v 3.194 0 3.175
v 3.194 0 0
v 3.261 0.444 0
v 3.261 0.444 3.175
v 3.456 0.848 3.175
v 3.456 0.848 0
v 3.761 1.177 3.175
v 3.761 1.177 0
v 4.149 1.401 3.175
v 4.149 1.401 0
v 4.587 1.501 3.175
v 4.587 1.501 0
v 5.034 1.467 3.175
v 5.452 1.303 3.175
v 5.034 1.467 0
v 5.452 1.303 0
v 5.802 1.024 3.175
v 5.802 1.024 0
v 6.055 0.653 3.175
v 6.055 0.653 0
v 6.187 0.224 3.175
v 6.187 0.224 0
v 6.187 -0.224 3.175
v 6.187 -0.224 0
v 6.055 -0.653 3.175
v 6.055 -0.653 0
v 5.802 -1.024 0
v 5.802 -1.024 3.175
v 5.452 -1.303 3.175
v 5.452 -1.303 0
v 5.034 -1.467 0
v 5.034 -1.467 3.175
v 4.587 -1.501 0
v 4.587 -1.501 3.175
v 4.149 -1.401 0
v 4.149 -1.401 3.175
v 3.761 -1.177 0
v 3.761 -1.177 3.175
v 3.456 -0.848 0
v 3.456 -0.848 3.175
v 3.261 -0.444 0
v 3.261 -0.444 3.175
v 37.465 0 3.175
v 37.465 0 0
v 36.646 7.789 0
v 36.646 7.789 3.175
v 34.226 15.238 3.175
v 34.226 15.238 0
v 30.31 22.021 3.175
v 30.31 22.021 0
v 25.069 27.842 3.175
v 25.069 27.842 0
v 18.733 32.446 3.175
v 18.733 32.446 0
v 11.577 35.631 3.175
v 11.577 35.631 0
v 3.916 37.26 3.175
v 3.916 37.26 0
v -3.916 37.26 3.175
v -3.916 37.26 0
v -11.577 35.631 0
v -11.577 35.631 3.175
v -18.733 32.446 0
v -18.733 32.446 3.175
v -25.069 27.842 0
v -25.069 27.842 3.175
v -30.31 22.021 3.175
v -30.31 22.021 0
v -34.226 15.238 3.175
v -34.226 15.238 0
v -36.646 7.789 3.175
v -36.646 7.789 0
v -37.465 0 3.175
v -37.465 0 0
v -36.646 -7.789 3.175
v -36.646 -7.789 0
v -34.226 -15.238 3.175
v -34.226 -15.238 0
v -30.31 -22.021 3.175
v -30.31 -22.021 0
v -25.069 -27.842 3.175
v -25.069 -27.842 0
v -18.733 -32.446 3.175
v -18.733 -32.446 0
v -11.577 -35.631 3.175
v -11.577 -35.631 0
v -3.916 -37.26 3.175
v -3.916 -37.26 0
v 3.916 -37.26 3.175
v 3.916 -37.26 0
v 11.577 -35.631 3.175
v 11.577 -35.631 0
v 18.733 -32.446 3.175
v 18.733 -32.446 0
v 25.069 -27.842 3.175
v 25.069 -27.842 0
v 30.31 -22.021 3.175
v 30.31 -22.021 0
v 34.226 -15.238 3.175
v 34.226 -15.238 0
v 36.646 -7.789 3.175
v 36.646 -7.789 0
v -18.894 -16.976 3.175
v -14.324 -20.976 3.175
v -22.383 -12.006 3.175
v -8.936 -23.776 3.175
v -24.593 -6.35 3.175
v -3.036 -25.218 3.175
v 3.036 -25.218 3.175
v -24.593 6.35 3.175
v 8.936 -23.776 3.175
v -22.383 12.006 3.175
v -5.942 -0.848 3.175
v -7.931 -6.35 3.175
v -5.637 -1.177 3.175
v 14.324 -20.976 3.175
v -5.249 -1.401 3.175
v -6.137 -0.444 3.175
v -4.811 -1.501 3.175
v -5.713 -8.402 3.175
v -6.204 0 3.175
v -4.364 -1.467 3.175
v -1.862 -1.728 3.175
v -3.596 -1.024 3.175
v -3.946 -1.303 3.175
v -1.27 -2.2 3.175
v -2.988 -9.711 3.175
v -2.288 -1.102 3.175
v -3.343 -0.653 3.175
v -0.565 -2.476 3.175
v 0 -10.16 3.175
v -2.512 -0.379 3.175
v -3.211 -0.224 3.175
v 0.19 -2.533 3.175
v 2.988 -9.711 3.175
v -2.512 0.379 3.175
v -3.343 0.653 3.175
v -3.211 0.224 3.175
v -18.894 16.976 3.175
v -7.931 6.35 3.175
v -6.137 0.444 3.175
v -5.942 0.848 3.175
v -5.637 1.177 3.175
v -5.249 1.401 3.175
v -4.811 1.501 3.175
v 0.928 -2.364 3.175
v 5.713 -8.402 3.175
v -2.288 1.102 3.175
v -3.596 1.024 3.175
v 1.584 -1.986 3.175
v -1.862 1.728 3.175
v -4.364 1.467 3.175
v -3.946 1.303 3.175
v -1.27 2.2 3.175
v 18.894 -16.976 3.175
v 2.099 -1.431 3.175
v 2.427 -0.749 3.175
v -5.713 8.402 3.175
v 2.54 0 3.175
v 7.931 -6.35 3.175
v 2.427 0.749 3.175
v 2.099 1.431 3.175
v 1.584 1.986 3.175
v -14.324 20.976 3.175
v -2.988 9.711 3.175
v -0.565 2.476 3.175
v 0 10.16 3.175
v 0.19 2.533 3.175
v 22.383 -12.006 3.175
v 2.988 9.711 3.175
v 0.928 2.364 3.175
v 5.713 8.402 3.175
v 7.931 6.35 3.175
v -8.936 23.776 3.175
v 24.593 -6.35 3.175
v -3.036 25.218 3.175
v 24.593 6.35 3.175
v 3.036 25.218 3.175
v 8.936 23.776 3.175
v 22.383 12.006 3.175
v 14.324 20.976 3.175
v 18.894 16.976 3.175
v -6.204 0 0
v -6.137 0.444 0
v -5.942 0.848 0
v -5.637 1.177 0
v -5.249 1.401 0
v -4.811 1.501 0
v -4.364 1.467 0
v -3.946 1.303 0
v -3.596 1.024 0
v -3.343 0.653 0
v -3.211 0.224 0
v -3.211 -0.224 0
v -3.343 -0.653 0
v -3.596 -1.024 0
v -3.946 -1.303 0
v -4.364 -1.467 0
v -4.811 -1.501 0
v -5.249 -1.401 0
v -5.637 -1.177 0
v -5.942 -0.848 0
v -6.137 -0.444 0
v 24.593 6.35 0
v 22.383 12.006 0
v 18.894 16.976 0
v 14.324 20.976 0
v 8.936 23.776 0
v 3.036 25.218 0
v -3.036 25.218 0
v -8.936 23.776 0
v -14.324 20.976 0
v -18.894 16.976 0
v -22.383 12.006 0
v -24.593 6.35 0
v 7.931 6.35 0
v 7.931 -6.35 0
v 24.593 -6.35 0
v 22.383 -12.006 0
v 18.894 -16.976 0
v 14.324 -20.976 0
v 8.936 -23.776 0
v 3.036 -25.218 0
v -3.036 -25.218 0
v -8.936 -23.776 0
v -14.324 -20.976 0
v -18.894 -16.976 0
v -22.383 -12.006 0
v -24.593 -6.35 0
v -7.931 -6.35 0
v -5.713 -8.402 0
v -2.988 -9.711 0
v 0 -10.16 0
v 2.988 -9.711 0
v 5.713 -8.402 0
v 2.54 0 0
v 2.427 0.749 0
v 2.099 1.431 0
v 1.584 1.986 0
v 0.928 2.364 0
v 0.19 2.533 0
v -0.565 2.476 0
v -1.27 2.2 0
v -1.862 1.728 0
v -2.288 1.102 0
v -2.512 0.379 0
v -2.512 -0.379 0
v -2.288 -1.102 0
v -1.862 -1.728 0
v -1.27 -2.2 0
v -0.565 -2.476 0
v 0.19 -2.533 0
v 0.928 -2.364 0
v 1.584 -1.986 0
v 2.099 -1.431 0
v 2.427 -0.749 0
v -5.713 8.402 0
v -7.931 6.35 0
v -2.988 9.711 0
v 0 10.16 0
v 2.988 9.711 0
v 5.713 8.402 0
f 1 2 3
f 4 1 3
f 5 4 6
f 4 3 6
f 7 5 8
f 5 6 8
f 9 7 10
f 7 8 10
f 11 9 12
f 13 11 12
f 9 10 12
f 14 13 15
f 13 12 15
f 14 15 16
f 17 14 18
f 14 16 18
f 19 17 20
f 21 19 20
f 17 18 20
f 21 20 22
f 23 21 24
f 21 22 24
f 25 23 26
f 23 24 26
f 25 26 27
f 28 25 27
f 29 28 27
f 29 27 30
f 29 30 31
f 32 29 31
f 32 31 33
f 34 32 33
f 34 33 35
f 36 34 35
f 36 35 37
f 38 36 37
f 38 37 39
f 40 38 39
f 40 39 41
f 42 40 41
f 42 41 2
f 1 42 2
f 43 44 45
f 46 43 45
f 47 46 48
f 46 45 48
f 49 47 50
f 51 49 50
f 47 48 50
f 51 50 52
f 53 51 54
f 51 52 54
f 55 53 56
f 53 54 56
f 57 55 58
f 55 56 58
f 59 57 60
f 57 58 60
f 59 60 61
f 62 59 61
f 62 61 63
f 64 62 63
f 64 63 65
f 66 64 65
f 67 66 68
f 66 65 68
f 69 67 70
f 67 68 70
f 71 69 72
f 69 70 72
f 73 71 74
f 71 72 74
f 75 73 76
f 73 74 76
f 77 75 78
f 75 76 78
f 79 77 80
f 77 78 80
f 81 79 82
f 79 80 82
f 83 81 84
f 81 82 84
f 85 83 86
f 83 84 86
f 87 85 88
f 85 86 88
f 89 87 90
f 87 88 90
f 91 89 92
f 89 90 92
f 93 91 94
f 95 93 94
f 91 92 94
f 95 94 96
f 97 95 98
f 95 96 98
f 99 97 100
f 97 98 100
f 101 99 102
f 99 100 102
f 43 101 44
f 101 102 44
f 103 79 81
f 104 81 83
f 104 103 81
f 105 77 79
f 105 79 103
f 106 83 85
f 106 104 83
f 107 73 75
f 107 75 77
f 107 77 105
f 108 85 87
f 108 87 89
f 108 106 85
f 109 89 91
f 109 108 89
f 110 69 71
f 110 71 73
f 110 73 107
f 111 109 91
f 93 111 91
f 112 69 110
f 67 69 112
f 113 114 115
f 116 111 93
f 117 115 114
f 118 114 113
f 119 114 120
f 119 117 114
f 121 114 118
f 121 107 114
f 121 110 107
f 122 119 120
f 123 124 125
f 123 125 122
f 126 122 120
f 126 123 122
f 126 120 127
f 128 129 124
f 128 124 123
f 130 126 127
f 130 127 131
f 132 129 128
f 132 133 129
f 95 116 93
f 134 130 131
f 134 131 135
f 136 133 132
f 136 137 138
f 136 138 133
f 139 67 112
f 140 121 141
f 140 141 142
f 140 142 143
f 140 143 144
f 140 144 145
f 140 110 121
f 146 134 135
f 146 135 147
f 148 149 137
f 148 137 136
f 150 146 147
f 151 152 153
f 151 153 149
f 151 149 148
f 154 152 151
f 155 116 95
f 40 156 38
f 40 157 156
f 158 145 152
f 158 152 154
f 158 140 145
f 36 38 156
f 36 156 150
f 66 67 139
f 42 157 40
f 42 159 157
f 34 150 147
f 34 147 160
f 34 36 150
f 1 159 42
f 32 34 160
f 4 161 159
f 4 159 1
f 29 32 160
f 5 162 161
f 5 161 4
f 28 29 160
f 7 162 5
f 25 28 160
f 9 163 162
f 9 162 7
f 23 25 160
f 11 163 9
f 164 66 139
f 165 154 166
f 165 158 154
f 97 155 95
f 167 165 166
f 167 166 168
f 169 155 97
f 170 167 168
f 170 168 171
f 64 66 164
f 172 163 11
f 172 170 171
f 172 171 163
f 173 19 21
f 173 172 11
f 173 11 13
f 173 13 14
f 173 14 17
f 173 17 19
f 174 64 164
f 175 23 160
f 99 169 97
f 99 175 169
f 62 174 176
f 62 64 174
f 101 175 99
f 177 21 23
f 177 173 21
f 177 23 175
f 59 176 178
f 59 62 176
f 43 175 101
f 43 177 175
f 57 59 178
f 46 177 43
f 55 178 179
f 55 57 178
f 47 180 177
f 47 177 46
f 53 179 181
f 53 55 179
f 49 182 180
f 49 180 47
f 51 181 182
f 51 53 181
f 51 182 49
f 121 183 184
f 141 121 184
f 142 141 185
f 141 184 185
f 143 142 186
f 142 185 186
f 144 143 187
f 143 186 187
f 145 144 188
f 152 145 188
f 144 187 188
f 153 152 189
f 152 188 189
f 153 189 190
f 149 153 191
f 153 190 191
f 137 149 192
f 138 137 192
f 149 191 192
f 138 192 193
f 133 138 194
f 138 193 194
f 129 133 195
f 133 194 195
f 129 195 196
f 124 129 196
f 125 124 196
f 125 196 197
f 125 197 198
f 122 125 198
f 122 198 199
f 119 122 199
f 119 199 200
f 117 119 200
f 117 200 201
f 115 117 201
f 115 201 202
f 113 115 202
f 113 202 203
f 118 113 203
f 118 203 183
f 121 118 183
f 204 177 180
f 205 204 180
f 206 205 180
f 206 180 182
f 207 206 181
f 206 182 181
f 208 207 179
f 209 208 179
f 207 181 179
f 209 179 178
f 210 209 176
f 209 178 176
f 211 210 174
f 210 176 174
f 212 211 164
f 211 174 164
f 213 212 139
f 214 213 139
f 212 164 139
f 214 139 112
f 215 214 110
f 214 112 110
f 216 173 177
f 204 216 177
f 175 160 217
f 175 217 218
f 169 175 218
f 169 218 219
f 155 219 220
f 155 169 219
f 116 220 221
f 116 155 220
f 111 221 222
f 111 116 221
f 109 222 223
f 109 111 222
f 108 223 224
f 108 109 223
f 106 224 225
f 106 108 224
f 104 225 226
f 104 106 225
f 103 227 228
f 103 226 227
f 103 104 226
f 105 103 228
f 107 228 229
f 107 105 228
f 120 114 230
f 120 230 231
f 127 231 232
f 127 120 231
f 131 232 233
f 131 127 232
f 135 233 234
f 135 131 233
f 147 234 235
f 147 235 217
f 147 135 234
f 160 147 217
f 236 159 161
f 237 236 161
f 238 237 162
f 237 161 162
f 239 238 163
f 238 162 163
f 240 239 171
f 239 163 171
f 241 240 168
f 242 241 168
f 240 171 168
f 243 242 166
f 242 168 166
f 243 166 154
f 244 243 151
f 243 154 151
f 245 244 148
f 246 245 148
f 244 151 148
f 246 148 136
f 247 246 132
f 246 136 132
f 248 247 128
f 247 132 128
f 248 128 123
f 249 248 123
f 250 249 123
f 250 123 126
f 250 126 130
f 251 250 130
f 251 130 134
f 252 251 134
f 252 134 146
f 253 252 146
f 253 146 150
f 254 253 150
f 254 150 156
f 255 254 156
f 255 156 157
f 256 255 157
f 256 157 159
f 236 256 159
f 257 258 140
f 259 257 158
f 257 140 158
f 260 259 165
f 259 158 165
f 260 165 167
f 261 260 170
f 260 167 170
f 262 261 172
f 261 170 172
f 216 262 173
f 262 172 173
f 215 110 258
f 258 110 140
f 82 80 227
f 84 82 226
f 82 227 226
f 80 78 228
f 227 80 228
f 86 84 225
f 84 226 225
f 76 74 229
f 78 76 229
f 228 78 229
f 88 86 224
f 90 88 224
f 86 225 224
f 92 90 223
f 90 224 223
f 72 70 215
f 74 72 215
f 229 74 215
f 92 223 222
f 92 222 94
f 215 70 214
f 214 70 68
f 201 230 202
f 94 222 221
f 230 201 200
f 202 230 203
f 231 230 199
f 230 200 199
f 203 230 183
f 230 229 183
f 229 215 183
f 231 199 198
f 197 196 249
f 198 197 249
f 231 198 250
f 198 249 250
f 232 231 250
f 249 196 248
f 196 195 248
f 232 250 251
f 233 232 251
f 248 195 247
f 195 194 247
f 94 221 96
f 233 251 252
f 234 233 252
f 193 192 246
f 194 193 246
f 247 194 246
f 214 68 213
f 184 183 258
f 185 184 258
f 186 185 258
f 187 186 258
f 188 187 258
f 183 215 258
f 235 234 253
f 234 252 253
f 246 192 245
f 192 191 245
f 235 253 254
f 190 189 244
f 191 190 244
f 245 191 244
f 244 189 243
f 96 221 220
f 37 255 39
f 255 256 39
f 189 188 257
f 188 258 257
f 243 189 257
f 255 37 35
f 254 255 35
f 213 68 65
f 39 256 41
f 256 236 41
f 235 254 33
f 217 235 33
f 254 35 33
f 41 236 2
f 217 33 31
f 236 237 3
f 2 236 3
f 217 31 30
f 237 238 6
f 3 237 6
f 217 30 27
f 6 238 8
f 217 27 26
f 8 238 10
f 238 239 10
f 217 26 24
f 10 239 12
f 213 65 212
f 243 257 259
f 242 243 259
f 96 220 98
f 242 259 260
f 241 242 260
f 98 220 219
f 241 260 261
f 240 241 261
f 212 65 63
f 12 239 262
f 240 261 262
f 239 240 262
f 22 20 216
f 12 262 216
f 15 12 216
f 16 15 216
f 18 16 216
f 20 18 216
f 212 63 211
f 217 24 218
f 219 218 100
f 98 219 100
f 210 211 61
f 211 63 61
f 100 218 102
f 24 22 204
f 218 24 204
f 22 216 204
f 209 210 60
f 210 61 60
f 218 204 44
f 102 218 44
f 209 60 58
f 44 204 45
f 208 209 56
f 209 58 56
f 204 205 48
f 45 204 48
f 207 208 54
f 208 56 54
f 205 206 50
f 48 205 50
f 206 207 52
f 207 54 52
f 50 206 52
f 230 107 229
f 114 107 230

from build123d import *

# Parameters (mm, degrees)
SKETCH1_R           = 37.465
BOSS_EXTRUDE1_DEPTH = 3.175
CUT_EXTRUDE1_DEPTH  = 54.078555698
SKETCH3_R           = 2.54
CUT_EXTRUDE2_DEPTH  = 54.078555698
SKETCH4_R           = 1.505
CUT_EXTRUDE3_DEPTH  = 54.078555698


with BuildPart() as part:
    # Sketch1 → Boss-Extrude1 (new body)
    with BuildSketch(Plane.XY):
        Circle(SKETCH1_R)
    extrude(amount=BOSS_EXTRUDE1_DEPTH)

    # Sketch2 → Cut-Extrude1 (cut, through all)
    with BuildSketch(Plane.XY.offset(3.175)):
        with BuildLine():
            Line((-24.593444248, -6.35), (-7.931147458, -6.35))
            ThreePointArc((-7.931147458, -6.35), (0, -10.16), (7.931147458, -6.35))
            Line((7.931147458, -6.35), (24.593444248, -6.35))
            ThreePointArc((24.593444248, -6.35), (0, -25.4), (-24.593444248, -6.35))
        make_face()
        with BuildLine():
            Line((7.931147458, 6.35), (24.593444248, 6.35))
            ThreePointArc((24.593444248, 6.35), (0, 25.4), (-24.593444248, 6.35))
            Line((-24.593444248, 6.35), (-7.931147458, 6.35))
            ThreePointArc((-7.931147458, 6.35), (0, 10.16), (7.931147458, 6.35))
        make_face()
    extrude(amount=-CUT_EXTRUDE1_DEPTH, mode=Mode.SUBTRACT)

    # Sketch3 → Cut-Extrude2 (cut, through all)
    with BuildSketch(Plane.XY.offset(3.175)):
        Circle(SKETCH3_R)
    extrude(amount=-CUT_EXTRUDE2_DEPTH, mode=Mode.SUBTRACT)

    # Sketch4 → Cut-Extrude3 (cut, through all)
    with BuildSketch(Plane(origin=(0, 0, 0), x_dir=(-1, 0, 0), z_dir=(0, 0, -1))):
        with Locations((-4.699, 0)):
            Circle(SKETCH4_R)
        with Locations((4.699, 0)):
            Circle(SKETCH4_R)
    extrude(amount=-CUT_EXTRUDE3_DEPTH, mode=Mode.SUBTRACT)


solid = part.part
